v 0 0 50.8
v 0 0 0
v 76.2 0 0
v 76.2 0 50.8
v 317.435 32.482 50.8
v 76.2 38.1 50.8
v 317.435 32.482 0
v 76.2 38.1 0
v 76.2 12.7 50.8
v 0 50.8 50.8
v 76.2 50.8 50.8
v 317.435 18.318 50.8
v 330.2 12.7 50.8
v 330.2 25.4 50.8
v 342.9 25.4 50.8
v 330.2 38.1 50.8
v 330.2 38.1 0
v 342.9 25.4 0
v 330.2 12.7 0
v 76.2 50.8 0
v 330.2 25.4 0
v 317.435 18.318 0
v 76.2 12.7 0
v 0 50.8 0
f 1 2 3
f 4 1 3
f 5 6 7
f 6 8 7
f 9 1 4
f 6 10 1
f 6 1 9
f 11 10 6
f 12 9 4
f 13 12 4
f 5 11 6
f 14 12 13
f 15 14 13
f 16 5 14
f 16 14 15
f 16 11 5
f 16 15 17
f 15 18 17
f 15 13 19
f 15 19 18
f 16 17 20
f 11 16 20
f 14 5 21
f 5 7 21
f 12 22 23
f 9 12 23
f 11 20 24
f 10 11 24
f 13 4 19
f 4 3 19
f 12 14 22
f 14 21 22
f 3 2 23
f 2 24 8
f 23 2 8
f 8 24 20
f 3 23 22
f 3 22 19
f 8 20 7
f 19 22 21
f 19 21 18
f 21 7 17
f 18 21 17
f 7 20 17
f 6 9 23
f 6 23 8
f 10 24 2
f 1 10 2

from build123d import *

# Parameters (mm, degrees)
F1_DEPTH = 50.8
F3_DEPTH = 25.4
F5_DEPTH = 25.4


with BuildPart() as f1:
    # F0 (on Top) → F1 (new body)
    with BuildSketch(Plane.XY):
        Polygon((0, 50.8), (0, 0), (76.2, 0), (330.2, 12.7), (342.9, 25.4), (330.2, 38.1), (76.2, 50.8), align=None)
        Polygon((76.2, 12.7), (76.2, 38.1), (317.434589, 32.481896), (330.2, 25.4), (317.434589, 18.318104), align=None, mode=Mode.SUBTRACT)
    extrude(amount=F1_DEPTH)

    # F2 (on face) → F3 (join)
    with BuildSketch(Plane.XY.offset(50.8)):
        Polygon((330.2, 38.1), (76.2, 50.8), (76.2, 38.1), (317.434589, 32.481896), (330.2, 25.4), (317.434589, 18.318104), (76.2, 12.7), (76.2, 0), (330.2, 12.7), (342.9, 25.4), align=None)
    extrude(amount=-F3_DEPTH)

    # F4 (on face) → F5 (join)
    with BuildSketch(Plane.XY.offset(50.8)):
        Polygon((330.2, 38.1), (76.2, 50.8), (76.2, 38.1), (317.434589, 32.481896), (330.2, 25.4), (317.434589, 18.318104), (76.2, 12.7), (76.2, 0), (330.2, 12.7), (342.9, 25.4), align=None)
    extrude(amount=-F5_DEPTH)


solid = f1.part
